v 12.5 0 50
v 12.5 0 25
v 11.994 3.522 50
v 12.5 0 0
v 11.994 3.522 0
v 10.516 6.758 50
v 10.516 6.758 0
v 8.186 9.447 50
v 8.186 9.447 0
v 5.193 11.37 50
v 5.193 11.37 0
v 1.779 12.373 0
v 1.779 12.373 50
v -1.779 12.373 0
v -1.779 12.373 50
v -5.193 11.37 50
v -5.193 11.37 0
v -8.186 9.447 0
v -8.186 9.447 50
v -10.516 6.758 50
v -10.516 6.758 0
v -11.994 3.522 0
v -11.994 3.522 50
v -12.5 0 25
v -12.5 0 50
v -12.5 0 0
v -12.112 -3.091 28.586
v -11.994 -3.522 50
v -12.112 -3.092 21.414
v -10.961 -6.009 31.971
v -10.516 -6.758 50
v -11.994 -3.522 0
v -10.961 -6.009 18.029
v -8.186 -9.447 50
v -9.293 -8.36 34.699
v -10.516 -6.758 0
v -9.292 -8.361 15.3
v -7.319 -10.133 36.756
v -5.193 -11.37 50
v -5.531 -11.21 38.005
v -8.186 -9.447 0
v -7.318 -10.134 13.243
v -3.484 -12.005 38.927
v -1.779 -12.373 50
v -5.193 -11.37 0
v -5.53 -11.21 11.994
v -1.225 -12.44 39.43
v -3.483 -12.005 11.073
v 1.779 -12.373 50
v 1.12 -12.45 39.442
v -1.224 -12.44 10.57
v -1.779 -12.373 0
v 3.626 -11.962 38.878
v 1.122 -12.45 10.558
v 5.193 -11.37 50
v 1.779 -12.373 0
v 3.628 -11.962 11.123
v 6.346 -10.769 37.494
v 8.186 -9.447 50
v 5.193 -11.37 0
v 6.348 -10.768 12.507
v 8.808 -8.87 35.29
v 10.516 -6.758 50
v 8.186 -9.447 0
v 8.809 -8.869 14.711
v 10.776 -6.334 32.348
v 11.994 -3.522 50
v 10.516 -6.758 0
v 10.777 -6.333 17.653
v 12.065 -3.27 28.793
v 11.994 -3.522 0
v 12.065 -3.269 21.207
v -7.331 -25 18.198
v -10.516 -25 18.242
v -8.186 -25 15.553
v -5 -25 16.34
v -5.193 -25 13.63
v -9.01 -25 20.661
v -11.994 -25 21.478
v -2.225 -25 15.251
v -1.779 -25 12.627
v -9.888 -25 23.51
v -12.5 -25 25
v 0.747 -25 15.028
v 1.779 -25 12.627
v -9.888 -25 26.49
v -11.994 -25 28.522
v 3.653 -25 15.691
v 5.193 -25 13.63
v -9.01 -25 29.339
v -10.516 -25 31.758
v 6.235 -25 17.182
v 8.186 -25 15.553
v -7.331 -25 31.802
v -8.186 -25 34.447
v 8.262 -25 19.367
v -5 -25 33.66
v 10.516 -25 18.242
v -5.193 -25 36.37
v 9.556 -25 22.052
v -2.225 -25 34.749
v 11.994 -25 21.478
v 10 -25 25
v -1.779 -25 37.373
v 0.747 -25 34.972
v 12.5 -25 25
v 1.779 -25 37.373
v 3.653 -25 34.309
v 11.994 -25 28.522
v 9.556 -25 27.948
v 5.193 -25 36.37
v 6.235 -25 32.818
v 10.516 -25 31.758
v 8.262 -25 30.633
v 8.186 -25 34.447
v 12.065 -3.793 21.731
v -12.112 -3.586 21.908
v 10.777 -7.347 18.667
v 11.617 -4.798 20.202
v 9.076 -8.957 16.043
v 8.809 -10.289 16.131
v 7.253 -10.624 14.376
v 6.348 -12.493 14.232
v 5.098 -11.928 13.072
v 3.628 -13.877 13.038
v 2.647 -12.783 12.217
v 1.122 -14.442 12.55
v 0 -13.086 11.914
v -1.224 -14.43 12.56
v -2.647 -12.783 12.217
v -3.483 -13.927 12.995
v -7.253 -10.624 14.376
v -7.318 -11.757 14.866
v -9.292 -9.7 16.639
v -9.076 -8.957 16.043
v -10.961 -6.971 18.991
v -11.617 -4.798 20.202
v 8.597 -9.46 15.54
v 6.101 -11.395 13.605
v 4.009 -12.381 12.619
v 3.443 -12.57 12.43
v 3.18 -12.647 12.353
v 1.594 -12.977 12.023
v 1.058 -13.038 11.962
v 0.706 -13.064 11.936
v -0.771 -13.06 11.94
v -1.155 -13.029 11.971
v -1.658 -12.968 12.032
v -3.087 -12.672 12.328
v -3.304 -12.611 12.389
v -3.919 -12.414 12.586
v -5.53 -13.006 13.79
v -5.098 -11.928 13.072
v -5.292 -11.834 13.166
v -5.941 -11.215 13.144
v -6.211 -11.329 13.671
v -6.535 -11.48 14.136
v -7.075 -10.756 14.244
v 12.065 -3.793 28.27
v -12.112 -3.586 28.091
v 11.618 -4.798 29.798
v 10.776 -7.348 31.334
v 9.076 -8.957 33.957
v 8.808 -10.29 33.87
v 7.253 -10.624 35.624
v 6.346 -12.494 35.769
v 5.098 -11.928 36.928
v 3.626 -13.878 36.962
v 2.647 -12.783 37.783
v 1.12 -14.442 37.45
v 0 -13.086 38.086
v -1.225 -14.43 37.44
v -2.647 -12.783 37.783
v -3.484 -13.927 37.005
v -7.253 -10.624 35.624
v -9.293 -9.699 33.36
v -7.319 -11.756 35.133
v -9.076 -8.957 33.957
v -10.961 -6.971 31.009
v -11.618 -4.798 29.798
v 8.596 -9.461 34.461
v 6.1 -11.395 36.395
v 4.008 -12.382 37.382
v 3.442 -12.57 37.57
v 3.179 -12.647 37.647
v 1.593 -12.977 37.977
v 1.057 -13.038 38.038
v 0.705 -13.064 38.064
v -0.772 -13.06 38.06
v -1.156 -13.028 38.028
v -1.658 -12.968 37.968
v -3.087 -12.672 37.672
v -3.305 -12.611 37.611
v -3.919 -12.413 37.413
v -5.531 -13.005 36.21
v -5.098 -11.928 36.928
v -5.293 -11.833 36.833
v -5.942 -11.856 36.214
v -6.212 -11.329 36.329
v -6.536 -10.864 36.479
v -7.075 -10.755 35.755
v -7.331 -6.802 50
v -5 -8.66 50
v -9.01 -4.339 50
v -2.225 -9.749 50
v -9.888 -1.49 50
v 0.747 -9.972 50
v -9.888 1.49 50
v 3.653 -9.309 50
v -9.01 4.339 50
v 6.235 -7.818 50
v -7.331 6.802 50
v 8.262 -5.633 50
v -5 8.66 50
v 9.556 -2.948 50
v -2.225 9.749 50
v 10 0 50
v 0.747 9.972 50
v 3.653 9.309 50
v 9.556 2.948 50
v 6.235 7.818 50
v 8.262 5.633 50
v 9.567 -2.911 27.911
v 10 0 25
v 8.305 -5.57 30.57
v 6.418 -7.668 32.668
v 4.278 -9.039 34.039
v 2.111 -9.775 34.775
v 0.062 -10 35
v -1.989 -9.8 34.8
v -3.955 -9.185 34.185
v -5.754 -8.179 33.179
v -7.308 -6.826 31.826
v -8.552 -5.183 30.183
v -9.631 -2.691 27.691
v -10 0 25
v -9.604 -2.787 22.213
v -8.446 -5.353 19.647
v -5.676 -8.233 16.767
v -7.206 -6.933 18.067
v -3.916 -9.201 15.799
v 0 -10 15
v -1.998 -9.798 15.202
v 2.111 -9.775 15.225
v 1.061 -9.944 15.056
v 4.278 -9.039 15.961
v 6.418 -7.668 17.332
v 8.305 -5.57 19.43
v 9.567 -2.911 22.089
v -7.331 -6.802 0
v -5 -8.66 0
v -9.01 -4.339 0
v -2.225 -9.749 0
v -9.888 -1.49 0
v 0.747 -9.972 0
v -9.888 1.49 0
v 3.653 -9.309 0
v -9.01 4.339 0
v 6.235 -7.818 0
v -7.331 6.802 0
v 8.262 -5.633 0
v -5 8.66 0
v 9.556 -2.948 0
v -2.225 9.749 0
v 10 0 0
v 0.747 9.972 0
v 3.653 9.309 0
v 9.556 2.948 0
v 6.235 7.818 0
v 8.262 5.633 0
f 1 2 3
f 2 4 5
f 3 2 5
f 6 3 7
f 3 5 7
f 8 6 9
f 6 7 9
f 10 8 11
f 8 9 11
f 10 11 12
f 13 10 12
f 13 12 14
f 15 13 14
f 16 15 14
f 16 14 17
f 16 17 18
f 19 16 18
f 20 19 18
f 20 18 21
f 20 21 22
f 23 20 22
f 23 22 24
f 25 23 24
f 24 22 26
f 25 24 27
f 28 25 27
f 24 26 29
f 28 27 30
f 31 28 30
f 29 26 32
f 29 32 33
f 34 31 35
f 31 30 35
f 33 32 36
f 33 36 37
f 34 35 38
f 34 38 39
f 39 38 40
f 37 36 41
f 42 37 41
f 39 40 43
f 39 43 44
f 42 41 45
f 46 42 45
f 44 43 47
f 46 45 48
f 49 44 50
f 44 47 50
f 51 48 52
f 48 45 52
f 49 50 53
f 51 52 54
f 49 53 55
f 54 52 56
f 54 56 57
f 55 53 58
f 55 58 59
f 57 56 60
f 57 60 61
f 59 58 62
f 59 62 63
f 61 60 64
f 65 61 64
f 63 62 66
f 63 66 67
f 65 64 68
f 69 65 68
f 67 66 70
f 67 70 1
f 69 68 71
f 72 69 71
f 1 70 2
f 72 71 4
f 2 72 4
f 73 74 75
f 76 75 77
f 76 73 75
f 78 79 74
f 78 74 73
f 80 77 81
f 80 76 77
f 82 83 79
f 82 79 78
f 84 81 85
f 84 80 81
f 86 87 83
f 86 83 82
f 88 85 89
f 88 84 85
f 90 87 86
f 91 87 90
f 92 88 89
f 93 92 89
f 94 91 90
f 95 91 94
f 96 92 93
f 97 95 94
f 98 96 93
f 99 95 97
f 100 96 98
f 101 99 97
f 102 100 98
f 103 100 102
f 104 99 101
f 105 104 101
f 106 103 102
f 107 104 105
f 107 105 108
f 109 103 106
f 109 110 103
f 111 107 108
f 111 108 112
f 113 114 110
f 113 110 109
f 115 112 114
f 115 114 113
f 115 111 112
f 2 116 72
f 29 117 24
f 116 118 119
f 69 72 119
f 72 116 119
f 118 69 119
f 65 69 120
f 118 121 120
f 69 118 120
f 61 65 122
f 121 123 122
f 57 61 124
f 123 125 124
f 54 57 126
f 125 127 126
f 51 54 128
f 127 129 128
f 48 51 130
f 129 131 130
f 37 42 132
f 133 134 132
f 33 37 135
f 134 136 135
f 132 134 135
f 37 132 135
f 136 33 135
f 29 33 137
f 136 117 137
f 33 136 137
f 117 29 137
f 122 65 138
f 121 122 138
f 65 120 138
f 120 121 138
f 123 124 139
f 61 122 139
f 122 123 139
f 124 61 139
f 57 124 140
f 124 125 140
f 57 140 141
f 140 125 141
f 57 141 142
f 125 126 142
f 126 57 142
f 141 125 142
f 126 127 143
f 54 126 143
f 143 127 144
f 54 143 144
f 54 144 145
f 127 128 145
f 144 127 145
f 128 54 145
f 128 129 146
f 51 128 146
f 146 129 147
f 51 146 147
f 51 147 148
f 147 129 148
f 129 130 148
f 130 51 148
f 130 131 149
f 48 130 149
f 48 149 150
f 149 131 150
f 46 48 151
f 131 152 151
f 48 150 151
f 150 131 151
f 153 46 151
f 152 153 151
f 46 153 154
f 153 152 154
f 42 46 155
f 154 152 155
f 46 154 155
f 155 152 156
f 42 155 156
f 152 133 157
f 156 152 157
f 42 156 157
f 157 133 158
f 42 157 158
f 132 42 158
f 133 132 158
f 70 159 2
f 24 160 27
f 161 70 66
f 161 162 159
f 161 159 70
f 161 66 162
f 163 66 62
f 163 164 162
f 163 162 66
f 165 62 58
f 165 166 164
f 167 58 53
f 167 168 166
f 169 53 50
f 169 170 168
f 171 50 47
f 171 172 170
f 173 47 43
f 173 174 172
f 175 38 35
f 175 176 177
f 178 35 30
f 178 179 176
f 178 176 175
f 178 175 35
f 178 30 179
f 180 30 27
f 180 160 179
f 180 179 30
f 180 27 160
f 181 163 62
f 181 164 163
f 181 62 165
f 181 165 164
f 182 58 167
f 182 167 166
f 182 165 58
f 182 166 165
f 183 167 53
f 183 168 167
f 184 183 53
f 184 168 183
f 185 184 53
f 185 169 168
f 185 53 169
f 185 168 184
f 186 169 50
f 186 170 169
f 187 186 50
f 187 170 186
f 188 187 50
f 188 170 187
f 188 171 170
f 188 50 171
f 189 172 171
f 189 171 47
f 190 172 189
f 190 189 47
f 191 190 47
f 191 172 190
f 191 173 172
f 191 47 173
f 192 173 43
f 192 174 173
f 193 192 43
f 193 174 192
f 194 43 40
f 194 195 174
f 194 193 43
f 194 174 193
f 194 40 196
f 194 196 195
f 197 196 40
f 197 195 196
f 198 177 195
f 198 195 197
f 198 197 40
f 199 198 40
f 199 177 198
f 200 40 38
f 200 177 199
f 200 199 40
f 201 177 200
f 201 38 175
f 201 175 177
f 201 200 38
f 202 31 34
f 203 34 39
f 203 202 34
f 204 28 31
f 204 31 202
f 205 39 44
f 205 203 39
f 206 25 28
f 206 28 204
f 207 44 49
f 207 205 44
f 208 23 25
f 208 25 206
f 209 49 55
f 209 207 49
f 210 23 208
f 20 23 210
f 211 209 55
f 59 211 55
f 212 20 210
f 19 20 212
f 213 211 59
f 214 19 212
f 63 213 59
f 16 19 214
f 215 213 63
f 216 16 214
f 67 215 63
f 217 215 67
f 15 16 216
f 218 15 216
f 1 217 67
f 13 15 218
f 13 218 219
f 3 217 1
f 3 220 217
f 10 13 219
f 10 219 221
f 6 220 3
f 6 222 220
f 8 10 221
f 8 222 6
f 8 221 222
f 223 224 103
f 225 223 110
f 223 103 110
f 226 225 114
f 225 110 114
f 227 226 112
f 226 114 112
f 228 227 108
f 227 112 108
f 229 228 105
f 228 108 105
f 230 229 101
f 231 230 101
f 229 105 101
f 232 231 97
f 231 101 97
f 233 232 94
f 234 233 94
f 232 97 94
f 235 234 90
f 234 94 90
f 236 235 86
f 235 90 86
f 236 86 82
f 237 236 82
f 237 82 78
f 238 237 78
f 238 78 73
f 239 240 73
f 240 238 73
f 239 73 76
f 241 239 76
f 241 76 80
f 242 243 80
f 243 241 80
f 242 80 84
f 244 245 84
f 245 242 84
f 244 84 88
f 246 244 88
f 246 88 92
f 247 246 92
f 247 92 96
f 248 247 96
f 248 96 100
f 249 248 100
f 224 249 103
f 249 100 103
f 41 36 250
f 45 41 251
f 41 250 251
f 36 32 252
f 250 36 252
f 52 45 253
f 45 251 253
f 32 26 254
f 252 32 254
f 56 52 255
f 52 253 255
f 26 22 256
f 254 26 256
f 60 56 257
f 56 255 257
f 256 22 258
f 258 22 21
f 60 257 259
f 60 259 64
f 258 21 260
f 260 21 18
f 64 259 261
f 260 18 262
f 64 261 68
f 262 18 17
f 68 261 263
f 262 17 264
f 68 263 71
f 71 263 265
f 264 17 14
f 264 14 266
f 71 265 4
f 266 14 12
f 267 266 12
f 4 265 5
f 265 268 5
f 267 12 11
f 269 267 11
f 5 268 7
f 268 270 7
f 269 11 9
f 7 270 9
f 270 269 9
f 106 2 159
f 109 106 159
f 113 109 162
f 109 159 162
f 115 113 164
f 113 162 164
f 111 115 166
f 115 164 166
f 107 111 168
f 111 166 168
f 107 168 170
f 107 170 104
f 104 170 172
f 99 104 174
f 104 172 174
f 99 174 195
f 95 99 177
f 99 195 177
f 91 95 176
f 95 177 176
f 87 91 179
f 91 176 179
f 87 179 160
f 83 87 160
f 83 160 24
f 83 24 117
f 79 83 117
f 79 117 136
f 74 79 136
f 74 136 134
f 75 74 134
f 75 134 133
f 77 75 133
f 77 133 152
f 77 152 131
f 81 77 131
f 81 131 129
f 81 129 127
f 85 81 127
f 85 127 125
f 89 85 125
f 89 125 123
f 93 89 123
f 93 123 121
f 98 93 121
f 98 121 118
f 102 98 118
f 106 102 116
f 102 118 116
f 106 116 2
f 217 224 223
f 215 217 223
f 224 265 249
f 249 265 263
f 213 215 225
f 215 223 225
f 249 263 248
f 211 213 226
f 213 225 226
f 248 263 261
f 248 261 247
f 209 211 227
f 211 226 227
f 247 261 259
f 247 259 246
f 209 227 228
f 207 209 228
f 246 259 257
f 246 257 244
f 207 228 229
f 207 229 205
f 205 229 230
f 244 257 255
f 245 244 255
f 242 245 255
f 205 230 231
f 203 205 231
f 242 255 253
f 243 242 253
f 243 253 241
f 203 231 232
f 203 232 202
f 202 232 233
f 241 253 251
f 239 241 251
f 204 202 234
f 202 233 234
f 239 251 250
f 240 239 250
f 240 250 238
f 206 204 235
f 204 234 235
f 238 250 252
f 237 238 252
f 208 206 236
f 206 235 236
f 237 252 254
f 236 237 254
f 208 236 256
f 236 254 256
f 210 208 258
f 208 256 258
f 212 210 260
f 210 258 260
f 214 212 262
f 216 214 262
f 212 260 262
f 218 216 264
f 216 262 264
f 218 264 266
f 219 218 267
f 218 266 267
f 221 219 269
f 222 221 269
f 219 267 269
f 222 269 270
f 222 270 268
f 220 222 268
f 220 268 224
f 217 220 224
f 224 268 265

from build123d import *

# Parameters (mm, degrees)
F0_R     = 12.5
F1_DEPTH = 50
F2_R     = 12.5
F3_DEPTH = 25
F4_R     = 10
F5_DEPTH = 50.001
F6_R     = 10
F7_DEPTH = 25
F8_R     = 2


with BuildPart() as f1:
    # F0 (on Top) → F1 (new body)
    with BuildSketch(Plane.XY):
        Circle(F0_R)
    extrude(amount=F1_DEPTH)

    # F2 (on Front) → F3 (join)
    with BuildSketch(Plane.XZ):
        with Locations((0, 25)):
            Circle(F2_R)
    extrude(amount=F3_DEPTH)

    # F4 (on face) → F5 (cut, through all)
    with BuildSketch(Plane(origin=(0, 0, 0), x_dir=(1, 0, 0), z_dir=(0, 0, -1))):
        Circle(F4_R)
    extrude(amount=-F5_DEPTH, mode=Mode.SUBTRACT)

    # F6 (on face) → F7 (cut)
    with BuildSketch(Plane.XZ.offset(25)):
        with Locations((0, 25)):
            Circle(F6_R)
    extrude(amount=-F7_DEPTH, mode=Mode.SUBTRACT)

    # F8
    f8_edges = [f1.edges().sort_by_distance(p)[0] for p in [
        (9.5412, -8.075611, 16.924389),
        (-9.5412, -8.075611, 16.924389),
        (-1.4e-05, -12.5, 37.5),
    ]]
    fillet(f8_edges, radius=F8_R)


solid = f1.part
